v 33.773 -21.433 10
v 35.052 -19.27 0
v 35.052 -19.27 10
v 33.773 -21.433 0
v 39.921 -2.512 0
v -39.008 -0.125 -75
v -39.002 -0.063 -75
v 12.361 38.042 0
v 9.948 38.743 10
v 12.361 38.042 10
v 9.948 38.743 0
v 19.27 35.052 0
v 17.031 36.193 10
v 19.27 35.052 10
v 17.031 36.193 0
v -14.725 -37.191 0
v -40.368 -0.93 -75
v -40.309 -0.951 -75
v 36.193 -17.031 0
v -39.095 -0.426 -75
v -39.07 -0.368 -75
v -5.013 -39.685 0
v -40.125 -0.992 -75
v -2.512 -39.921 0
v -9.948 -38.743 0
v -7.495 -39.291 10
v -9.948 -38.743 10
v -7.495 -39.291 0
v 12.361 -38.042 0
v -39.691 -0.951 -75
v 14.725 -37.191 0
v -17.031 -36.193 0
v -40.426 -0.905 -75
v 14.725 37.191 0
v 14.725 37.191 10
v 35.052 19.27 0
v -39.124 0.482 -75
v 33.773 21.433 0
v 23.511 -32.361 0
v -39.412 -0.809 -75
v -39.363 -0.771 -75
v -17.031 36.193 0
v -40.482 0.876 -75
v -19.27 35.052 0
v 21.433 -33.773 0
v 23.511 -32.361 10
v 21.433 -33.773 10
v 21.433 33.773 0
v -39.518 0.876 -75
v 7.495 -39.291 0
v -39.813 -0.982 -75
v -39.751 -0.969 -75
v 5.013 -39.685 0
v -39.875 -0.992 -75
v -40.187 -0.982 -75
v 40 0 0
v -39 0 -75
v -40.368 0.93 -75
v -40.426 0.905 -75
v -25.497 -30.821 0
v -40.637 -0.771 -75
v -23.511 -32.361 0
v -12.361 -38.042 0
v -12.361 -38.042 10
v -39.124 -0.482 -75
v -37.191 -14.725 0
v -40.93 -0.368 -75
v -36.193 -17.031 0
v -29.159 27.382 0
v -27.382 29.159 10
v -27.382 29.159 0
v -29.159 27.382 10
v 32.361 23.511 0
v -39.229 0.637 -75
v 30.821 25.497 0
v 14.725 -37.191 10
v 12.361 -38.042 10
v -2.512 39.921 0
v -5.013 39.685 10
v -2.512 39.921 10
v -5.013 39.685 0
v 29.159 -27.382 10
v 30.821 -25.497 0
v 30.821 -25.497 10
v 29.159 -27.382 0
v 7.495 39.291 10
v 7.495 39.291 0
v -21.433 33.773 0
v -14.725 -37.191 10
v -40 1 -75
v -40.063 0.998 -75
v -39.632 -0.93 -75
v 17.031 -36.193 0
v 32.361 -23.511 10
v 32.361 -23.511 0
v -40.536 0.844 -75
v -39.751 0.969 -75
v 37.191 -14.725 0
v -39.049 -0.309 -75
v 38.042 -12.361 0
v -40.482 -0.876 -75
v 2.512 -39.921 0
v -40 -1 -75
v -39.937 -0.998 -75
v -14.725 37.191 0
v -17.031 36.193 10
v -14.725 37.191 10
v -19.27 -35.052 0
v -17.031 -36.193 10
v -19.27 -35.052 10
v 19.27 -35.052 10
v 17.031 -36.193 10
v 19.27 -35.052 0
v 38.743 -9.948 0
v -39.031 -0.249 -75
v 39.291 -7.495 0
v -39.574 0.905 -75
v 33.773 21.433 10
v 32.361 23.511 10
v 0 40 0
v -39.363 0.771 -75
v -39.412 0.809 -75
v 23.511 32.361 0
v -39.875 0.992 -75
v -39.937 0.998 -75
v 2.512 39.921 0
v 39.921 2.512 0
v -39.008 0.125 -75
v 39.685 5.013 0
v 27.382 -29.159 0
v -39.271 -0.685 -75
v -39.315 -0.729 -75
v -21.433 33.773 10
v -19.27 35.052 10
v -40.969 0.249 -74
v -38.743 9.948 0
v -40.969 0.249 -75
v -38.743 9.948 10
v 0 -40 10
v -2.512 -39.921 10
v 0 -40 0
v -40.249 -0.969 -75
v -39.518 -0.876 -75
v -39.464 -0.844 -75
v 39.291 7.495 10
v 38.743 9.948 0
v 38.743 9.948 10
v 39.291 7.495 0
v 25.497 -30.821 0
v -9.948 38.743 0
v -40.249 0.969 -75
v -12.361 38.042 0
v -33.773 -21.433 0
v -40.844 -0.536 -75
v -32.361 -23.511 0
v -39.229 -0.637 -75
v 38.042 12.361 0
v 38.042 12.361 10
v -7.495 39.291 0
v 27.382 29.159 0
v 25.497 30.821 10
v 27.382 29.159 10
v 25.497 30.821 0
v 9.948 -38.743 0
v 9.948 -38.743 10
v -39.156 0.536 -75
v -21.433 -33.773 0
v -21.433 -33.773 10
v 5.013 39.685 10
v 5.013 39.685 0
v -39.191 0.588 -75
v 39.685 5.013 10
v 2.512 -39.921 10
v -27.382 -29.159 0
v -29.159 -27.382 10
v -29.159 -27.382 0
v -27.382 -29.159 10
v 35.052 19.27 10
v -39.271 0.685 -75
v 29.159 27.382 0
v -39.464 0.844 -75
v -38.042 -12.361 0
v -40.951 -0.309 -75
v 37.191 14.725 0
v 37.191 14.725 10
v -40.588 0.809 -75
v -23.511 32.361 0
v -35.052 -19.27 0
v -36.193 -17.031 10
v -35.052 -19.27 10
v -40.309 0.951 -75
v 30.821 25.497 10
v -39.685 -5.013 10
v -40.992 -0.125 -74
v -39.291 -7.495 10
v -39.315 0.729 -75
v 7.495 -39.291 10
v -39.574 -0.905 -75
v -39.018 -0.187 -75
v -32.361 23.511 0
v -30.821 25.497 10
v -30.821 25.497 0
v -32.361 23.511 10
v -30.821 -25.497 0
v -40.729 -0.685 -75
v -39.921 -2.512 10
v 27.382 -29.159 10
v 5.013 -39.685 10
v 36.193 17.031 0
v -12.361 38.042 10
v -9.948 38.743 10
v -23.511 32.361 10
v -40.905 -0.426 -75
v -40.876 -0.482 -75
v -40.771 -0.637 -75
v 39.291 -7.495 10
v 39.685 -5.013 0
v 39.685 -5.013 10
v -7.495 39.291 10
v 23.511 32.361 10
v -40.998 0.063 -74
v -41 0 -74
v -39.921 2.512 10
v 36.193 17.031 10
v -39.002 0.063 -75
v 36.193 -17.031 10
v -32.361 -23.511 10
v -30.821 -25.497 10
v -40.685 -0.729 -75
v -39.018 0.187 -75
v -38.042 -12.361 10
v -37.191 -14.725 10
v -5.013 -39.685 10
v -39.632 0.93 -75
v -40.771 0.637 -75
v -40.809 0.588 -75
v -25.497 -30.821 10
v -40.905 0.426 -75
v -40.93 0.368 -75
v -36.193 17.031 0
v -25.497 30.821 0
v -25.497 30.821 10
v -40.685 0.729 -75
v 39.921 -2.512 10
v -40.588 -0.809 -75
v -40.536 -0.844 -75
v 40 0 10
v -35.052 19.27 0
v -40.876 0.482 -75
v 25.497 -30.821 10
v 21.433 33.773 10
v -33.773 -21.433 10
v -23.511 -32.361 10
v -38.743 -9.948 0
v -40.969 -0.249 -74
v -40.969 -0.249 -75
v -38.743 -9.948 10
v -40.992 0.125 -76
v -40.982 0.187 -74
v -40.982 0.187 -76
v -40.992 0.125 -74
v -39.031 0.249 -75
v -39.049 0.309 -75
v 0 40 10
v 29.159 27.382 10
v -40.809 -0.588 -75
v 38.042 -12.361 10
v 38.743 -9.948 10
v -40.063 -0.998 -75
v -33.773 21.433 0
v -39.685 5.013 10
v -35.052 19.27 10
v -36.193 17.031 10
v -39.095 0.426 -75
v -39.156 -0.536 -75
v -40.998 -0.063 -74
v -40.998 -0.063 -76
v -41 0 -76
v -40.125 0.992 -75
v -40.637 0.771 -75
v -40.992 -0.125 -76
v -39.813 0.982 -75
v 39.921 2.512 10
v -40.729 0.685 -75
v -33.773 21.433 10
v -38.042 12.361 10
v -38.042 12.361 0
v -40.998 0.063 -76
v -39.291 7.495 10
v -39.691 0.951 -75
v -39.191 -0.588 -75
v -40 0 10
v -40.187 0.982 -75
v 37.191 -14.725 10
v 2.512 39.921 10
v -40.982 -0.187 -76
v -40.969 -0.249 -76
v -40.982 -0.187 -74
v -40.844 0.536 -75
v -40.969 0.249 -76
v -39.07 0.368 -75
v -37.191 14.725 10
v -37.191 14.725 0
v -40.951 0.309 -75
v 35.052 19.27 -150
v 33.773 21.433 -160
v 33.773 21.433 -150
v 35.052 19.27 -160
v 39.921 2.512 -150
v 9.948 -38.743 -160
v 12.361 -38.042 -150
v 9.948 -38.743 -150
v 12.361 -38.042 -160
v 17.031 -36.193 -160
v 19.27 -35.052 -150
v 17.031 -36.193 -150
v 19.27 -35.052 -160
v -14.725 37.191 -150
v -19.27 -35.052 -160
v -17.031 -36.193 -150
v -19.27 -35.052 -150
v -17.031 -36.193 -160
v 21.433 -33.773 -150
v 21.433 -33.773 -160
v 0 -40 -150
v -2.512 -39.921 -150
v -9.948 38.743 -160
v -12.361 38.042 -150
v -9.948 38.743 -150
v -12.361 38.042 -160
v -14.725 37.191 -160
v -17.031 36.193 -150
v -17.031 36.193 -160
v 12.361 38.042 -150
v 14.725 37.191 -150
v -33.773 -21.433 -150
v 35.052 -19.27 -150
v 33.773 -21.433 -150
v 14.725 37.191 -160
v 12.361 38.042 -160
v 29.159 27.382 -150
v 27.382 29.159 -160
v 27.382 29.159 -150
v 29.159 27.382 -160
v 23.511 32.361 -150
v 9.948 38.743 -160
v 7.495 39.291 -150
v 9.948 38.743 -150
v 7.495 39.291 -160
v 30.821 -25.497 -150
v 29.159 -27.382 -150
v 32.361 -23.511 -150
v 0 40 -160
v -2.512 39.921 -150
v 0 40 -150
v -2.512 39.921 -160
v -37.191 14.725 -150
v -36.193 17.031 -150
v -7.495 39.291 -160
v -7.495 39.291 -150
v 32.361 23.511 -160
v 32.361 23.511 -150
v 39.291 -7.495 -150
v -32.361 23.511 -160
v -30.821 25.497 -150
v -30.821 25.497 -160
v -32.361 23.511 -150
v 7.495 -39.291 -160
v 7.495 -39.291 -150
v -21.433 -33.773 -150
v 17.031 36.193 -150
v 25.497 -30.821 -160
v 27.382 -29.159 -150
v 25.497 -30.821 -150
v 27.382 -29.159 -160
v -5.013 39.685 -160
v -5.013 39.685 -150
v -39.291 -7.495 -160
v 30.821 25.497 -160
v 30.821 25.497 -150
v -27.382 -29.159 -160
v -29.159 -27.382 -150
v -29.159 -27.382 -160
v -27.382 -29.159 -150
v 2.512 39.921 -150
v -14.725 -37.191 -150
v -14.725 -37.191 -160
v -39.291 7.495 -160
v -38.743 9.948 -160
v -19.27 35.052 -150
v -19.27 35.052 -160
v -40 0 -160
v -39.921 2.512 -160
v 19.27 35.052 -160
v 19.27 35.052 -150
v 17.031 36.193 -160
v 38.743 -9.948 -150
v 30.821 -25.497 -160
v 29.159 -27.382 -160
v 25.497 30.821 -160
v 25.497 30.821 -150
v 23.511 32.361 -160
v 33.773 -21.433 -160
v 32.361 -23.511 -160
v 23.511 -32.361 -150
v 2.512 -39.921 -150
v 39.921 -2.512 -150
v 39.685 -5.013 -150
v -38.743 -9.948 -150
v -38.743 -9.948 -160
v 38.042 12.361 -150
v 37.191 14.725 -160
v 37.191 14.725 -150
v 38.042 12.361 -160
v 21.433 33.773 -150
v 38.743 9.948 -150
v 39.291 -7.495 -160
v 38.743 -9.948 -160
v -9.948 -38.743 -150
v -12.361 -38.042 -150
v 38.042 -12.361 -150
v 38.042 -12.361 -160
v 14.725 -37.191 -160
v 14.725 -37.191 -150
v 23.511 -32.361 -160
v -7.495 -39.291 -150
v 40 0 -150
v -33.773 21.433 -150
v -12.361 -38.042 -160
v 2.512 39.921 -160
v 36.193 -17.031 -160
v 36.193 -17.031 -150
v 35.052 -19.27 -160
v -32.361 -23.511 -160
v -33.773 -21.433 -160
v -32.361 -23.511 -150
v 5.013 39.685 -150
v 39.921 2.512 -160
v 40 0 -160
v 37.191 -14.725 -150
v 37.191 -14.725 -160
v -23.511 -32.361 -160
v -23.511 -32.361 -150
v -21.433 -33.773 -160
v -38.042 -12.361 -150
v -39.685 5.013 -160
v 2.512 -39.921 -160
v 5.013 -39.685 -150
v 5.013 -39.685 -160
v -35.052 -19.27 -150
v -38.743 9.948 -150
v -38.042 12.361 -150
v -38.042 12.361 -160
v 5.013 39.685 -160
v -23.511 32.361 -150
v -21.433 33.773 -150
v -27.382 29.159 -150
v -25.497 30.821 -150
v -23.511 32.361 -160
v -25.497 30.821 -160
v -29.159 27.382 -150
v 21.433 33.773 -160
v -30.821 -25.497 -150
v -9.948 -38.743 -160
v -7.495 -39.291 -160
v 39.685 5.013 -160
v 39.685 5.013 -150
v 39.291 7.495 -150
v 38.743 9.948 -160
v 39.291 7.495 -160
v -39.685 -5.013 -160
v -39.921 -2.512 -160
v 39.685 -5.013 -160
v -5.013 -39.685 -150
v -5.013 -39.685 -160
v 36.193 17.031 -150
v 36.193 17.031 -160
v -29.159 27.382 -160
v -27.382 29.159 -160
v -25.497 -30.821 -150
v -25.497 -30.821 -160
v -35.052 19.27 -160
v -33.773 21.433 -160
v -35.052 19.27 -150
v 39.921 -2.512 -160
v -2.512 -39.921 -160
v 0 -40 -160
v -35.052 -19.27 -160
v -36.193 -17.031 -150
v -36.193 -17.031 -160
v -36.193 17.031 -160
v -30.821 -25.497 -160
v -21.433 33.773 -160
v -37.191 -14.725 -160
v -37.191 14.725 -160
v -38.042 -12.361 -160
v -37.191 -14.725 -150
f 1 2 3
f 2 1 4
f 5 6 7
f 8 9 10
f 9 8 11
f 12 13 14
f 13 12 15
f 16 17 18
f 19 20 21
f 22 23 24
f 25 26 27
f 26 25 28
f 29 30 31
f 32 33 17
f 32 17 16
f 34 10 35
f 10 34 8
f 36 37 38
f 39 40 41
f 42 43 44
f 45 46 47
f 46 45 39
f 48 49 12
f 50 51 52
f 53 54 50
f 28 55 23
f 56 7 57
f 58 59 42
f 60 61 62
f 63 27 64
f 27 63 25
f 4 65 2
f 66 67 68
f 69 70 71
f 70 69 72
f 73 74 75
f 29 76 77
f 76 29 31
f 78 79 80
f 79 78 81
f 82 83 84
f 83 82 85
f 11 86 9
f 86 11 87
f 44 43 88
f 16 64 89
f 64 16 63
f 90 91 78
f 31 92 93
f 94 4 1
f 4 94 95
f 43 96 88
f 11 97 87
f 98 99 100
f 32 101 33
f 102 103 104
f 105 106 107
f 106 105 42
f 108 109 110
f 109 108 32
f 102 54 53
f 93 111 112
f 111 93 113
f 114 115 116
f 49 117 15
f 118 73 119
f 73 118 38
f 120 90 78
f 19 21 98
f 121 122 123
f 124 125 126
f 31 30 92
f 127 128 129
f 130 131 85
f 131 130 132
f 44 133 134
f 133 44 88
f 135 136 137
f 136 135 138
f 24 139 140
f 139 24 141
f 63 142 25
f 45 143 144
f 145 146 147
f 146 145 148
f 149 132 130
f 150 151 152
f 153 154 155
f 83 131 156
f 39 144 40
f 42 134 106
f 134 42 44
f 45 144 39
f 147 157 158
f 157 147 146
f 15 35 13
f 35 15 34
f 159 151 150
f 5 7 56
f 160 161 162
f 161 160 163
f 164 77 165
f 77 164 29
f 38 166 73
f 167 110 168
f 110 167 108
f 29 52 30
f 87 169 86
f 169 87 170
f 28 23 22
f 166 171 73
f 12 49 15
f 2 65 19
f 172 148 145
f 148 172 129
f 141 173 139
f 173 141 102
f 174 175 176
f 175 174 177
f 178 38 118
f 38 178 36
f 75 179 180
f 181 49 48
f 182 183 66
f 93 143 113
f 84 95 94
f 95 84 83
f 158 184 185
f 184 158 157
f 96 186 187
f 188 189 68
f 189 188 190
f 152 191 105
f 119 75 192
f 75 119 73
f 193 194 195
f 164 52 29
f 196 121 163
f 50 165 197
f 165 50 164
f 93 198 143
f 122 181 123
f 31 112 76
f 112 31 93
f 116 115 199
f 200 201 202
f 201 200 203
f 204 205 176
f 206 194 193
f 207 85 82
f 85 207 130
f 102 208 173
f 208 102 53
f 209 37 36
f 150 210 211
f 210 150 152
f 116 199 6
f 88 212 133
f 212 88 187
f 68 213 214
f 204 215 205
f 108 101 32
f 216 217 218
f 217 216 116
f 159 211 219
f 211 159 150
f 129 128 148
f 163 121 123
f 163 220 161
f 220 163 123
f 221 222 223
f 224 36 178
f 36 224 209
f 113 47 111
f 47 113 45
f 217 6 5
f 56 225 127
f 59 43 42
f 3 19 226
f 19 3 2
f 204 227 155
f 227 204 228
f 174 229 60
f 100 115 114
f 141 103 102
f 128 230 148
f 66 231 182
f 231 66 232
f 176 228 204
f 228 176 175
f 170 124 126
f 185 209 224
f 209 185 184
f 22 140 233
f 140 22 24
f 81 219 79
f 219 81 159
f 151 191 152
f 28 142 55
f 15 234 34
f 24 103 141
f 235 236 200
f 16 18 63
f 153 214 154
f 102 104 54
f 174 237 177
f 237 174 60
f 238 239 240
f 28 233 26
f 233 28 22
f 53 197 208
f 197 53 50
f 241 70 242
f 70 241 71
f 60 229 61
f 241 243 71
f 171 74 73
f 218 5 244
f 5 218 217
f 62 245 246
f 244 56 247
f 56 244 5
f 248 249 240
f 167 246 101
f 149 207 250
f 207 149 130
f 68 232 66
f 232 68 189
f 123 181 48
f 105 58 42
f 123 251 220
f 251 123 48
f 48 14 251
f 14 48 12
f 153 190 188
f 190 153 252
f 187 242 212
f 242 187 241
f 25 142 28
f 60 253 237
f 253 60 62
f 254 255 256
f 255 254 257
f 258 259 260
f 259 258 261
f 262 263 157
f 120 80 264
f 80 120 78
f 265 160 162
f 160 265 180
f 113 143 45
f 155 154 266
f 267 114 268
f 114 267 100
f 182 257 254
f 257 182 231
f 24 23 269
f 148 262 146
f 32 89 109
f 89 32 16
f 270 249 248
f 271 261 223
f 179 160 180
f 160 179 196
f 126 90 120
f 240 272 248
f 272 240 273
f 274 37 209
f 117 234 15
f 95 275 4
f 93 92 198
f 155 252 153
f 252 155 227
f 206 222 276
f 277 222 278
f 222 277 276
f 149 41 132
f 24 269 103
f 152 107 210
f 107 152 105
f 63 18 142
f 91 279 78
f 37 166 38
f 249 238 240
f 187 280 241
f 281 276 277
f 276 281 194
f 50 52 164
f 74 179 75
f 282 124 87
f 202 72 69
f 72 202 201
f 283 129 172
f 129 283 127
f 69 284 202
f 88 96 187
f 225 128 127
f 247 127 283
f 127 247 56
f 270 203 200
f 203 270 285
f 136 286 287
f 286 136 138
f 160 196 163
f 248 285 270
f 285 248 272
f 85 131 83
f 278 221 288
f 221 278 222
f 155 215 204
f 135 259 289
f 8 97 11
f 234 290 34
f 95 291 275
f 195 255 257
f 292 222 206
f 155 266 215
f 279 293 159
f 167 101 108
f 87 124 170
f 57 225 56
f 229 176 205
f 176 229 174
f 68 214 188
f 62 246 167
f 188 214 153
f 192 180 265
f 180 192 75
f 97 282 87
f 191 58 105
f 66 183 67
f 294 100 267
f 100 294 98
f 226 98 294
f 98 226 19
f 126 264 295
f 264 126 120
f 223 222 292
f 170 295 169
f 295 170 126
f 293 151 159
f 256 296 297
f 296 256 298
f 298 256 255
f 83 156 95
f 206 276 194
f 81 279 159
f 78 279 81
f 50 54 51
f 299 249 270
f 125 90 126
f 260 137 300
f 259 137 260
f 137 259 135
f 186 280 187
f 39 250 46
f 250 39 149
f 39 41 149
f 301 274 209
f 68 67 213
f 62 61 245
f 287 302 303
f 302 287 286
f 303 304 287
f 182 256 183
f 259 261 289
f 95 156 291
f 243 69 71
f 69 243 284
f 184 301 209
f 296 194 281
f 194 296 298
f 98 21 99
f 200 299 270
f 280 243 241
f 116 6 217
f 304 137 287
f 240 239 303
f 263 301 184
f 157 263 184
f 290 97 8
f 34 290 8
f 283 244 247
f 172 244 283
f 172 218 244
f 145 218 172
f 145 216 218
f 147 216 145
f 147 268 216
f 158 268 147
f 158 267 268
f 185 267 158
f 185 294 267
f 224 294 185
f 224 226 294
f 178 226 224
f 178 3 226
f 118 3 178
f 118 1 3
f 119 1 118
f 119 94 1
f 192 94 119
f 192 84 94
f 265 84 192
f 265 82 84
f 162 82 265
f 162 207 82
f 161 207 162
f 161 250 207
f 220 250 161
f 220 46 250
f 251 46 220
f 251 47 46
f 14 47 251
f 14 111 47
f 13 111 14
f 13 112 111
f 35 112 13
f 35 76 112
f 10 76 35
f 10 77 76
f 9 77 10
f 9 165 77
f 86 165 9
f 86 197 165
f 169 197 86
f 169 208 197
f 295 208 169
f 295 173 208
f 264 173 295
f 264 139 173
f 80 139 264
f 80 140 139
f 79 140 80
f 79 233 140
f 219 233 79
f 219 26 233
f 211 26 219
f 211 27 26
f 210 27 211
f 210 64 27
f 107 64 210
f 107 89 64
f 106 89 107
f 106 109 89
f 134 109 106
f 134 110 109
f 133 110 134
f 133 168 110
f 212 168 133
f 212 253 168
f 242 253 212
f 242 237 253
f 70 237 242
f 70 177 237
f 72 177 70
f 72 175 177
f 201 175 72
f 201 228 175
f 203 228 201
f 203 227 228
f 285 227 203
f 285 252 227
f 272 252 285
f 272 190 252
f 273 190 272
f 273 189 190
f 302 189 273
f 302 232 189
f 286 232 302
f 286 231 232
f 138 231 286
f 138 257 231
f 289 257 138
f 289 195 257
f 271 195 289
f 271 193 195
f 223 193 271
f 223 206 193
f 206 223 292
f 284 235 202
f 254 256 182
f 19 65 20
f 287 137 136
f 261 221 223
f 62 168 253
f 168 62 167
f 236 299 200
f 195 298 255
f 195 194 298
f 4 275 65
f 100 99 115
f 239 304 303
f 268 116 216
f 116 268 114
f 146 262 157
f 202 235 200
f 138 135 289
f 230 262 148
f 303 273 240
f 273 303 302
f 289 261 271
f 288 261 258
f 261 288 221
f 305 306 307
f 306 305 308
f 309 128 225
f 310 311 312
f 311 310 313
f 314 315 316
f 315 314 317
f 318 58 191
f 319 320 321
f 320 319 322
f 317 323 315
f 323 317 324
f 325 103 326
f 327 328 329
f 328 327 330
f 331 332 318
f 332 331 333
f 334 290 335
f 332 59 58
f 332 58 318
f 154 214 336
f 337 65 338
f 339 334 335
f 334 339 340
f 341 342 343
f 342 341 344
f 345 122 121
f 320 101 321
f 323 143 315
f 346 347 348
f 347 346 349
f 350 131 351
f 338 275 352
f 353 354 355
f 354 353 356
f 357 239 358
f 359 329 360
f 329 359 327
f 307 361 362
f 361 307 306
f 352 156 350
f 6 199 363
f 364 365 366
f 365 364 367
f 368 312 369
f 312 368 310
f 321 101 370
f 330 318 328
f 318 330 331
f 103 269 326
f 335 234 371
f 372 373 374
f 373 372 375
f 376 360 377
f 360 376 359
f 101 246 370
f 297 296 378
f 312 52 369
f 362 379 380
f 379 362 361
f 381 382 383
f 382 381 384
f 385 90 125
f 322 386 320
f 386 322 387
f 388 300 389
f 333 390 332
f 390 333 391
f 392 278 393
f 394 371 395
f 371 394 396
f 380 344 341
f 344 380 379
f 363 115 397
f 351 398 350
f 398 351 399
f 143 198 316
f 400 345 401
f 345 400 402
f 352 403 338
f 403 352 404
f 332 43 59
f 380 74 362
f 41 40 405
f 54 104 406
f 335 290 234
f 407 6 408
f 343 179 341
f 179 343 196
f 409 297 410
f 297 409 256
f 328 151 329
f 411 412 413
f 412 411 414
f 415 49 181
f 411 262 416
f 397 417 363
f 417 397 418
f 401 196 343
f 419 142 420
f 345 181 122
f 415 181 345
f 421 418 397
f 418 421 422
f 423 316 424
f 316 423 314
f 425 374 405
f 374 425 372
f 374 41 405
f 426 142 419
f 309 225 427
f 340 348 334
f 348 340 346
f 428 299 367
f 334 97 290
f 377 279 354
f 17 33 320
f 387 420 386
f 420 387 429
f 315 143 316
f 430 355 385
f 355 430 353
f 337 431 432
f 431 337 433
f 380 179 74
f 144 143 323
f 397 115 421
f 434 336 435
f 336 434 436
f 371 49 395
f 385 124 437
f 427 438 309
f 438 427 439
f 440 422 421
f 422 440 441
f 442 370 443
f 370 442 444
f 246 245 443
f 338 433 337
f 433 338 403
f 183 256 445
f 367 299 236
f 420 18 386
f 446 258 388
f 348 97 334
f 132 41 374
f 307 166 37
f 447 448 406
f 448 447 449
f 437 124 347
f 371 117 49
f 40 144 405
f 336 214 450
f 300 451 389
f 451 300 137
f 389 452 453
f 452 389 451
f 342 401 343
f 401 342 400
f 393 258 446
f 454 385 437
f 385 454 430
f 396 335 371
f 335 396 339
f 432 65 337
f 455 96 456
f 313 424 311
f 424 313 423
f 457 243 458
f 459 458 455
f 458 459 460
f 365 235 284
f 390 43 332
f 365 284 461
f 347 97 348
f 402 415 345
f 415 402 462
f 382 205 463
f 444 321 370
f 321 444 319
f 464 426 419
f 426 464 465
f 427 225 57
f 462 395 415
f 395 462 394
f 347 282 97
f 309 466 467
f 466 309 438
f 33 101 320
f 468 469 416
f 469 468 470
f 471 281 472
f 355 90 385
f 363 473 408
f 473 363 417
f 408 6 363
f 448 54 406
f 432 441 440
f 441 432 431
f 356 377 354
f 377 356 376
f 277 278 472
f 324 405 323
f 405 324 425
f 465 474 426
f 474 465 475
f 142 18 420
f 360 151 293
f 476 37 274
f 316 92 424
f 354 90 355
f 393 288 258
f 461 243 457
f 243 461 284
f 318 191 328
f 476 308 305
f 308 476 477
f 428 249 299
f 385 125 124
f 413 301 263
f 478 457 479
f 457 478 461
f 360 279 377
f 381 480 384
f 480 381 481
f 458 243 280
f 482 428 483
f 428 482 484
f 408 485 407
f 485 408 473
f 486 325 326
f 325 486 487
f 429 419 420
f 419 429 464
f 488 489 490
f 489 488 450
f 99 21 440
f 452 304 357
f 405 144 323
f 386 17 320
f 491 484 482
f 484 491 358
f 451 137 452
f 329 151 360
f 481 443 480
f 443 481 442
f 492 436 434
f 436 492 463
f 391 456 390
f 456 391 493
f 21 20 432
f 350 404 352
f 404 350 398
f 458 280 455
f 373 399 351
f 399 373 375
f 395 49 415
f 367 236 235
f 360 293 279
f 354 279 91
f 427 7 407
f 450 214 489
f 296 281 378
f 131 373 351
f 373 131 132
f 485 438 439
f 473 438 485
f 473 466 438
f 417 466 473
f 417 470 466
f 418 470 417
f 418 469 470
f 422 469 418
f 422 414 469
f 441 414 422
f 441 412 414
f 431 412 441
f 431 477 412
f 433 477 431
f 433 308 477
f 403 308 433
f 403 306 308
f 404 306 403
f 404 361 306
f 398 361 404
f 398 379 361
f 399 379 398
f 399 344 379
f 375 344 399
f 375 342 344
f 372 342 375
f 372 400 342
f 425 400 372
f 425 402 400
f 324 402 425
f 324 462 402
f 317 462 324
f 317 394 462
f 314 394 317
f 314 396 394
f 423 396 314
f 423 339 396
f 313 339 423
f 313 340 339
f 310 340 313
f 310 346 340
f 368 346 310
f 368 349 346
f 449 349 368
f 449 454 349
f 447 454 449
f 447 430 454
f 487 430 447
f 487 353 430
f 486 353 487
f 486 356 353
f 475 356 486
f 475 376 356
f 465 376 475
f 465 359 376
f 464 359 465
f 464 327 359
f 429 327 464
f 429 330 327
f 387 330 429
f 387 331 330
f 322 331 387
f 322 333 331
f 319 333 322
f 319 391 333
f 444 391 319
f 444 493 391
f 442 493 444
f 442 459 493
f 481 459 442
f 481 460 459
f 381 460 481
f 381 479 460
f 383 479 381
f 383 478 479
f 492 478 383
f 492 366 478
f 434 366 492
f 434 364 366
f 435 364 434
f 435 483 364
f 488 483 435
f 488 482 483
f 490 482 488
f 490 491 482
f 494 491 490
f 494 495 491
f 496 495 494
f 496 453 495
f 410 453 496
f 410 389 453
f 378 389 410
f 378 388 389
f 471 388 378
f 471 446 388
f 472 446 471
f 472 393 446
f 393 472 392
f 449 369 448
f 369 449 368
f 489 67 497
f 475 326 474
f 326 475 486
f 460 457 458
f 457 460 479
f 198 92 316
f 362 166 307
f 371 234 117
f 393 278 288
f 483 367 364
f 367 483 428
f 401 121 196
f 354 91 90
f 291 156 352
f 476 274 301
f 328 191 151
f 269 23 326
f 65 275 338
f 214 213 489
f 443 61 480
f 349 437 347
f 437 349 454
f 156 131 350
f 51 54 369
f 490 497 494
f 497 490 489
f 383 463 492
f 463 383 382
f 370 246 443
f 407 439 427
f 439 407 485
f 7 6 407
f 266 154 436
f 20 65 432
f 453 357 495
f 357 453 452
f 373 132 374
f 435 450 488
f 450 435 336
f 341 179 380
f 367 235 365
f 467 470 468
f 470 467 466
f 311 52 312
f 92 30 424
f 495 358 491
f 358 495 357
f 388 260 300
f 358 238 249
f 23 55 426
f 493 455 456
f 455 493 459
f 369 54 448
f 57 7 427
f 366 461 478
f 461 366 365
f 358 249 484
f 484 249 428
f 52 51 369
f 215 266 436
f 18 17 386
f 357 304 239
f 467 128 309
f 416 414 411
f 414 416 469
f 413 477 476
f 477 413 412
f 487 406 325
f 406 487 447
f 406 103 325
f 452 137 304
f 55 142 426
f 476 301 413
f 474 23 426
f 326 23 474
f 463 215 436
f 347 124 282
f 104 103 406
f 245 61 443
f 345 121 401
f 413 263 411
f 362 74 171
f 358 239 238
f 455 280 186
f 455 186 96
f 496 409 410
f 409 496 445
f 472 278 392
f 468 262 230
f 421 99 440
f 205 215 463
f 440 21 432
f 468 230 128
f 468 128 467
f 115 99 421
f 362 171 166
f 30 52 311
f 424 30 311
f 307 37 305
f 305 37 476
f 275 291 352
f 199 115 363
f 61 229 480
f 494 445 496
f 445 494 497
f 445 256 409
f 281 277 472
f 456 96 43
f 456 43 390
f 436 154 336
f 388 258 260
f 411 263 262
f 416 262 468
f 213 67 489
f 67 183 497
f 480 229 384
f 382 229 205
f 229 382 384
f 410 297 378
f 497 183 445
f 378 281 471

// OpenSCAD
$fn=100;

cone_height = 150;
coin_radius = 40;

module coin() {
    cylinder(10, r=coin_radius);
}

module mini_coin() {
    cylinder(1, r=1);
}

module cone() {
    hull() {
        coin();
        translate([-coin_radius,0,-cone_height/2]) mini_coin();
    }
}

module double_cone() {
   cone();
   translate([0, 0, -cone_height]) rotate([0, 180, 180]) cone();
}

double_cone();
